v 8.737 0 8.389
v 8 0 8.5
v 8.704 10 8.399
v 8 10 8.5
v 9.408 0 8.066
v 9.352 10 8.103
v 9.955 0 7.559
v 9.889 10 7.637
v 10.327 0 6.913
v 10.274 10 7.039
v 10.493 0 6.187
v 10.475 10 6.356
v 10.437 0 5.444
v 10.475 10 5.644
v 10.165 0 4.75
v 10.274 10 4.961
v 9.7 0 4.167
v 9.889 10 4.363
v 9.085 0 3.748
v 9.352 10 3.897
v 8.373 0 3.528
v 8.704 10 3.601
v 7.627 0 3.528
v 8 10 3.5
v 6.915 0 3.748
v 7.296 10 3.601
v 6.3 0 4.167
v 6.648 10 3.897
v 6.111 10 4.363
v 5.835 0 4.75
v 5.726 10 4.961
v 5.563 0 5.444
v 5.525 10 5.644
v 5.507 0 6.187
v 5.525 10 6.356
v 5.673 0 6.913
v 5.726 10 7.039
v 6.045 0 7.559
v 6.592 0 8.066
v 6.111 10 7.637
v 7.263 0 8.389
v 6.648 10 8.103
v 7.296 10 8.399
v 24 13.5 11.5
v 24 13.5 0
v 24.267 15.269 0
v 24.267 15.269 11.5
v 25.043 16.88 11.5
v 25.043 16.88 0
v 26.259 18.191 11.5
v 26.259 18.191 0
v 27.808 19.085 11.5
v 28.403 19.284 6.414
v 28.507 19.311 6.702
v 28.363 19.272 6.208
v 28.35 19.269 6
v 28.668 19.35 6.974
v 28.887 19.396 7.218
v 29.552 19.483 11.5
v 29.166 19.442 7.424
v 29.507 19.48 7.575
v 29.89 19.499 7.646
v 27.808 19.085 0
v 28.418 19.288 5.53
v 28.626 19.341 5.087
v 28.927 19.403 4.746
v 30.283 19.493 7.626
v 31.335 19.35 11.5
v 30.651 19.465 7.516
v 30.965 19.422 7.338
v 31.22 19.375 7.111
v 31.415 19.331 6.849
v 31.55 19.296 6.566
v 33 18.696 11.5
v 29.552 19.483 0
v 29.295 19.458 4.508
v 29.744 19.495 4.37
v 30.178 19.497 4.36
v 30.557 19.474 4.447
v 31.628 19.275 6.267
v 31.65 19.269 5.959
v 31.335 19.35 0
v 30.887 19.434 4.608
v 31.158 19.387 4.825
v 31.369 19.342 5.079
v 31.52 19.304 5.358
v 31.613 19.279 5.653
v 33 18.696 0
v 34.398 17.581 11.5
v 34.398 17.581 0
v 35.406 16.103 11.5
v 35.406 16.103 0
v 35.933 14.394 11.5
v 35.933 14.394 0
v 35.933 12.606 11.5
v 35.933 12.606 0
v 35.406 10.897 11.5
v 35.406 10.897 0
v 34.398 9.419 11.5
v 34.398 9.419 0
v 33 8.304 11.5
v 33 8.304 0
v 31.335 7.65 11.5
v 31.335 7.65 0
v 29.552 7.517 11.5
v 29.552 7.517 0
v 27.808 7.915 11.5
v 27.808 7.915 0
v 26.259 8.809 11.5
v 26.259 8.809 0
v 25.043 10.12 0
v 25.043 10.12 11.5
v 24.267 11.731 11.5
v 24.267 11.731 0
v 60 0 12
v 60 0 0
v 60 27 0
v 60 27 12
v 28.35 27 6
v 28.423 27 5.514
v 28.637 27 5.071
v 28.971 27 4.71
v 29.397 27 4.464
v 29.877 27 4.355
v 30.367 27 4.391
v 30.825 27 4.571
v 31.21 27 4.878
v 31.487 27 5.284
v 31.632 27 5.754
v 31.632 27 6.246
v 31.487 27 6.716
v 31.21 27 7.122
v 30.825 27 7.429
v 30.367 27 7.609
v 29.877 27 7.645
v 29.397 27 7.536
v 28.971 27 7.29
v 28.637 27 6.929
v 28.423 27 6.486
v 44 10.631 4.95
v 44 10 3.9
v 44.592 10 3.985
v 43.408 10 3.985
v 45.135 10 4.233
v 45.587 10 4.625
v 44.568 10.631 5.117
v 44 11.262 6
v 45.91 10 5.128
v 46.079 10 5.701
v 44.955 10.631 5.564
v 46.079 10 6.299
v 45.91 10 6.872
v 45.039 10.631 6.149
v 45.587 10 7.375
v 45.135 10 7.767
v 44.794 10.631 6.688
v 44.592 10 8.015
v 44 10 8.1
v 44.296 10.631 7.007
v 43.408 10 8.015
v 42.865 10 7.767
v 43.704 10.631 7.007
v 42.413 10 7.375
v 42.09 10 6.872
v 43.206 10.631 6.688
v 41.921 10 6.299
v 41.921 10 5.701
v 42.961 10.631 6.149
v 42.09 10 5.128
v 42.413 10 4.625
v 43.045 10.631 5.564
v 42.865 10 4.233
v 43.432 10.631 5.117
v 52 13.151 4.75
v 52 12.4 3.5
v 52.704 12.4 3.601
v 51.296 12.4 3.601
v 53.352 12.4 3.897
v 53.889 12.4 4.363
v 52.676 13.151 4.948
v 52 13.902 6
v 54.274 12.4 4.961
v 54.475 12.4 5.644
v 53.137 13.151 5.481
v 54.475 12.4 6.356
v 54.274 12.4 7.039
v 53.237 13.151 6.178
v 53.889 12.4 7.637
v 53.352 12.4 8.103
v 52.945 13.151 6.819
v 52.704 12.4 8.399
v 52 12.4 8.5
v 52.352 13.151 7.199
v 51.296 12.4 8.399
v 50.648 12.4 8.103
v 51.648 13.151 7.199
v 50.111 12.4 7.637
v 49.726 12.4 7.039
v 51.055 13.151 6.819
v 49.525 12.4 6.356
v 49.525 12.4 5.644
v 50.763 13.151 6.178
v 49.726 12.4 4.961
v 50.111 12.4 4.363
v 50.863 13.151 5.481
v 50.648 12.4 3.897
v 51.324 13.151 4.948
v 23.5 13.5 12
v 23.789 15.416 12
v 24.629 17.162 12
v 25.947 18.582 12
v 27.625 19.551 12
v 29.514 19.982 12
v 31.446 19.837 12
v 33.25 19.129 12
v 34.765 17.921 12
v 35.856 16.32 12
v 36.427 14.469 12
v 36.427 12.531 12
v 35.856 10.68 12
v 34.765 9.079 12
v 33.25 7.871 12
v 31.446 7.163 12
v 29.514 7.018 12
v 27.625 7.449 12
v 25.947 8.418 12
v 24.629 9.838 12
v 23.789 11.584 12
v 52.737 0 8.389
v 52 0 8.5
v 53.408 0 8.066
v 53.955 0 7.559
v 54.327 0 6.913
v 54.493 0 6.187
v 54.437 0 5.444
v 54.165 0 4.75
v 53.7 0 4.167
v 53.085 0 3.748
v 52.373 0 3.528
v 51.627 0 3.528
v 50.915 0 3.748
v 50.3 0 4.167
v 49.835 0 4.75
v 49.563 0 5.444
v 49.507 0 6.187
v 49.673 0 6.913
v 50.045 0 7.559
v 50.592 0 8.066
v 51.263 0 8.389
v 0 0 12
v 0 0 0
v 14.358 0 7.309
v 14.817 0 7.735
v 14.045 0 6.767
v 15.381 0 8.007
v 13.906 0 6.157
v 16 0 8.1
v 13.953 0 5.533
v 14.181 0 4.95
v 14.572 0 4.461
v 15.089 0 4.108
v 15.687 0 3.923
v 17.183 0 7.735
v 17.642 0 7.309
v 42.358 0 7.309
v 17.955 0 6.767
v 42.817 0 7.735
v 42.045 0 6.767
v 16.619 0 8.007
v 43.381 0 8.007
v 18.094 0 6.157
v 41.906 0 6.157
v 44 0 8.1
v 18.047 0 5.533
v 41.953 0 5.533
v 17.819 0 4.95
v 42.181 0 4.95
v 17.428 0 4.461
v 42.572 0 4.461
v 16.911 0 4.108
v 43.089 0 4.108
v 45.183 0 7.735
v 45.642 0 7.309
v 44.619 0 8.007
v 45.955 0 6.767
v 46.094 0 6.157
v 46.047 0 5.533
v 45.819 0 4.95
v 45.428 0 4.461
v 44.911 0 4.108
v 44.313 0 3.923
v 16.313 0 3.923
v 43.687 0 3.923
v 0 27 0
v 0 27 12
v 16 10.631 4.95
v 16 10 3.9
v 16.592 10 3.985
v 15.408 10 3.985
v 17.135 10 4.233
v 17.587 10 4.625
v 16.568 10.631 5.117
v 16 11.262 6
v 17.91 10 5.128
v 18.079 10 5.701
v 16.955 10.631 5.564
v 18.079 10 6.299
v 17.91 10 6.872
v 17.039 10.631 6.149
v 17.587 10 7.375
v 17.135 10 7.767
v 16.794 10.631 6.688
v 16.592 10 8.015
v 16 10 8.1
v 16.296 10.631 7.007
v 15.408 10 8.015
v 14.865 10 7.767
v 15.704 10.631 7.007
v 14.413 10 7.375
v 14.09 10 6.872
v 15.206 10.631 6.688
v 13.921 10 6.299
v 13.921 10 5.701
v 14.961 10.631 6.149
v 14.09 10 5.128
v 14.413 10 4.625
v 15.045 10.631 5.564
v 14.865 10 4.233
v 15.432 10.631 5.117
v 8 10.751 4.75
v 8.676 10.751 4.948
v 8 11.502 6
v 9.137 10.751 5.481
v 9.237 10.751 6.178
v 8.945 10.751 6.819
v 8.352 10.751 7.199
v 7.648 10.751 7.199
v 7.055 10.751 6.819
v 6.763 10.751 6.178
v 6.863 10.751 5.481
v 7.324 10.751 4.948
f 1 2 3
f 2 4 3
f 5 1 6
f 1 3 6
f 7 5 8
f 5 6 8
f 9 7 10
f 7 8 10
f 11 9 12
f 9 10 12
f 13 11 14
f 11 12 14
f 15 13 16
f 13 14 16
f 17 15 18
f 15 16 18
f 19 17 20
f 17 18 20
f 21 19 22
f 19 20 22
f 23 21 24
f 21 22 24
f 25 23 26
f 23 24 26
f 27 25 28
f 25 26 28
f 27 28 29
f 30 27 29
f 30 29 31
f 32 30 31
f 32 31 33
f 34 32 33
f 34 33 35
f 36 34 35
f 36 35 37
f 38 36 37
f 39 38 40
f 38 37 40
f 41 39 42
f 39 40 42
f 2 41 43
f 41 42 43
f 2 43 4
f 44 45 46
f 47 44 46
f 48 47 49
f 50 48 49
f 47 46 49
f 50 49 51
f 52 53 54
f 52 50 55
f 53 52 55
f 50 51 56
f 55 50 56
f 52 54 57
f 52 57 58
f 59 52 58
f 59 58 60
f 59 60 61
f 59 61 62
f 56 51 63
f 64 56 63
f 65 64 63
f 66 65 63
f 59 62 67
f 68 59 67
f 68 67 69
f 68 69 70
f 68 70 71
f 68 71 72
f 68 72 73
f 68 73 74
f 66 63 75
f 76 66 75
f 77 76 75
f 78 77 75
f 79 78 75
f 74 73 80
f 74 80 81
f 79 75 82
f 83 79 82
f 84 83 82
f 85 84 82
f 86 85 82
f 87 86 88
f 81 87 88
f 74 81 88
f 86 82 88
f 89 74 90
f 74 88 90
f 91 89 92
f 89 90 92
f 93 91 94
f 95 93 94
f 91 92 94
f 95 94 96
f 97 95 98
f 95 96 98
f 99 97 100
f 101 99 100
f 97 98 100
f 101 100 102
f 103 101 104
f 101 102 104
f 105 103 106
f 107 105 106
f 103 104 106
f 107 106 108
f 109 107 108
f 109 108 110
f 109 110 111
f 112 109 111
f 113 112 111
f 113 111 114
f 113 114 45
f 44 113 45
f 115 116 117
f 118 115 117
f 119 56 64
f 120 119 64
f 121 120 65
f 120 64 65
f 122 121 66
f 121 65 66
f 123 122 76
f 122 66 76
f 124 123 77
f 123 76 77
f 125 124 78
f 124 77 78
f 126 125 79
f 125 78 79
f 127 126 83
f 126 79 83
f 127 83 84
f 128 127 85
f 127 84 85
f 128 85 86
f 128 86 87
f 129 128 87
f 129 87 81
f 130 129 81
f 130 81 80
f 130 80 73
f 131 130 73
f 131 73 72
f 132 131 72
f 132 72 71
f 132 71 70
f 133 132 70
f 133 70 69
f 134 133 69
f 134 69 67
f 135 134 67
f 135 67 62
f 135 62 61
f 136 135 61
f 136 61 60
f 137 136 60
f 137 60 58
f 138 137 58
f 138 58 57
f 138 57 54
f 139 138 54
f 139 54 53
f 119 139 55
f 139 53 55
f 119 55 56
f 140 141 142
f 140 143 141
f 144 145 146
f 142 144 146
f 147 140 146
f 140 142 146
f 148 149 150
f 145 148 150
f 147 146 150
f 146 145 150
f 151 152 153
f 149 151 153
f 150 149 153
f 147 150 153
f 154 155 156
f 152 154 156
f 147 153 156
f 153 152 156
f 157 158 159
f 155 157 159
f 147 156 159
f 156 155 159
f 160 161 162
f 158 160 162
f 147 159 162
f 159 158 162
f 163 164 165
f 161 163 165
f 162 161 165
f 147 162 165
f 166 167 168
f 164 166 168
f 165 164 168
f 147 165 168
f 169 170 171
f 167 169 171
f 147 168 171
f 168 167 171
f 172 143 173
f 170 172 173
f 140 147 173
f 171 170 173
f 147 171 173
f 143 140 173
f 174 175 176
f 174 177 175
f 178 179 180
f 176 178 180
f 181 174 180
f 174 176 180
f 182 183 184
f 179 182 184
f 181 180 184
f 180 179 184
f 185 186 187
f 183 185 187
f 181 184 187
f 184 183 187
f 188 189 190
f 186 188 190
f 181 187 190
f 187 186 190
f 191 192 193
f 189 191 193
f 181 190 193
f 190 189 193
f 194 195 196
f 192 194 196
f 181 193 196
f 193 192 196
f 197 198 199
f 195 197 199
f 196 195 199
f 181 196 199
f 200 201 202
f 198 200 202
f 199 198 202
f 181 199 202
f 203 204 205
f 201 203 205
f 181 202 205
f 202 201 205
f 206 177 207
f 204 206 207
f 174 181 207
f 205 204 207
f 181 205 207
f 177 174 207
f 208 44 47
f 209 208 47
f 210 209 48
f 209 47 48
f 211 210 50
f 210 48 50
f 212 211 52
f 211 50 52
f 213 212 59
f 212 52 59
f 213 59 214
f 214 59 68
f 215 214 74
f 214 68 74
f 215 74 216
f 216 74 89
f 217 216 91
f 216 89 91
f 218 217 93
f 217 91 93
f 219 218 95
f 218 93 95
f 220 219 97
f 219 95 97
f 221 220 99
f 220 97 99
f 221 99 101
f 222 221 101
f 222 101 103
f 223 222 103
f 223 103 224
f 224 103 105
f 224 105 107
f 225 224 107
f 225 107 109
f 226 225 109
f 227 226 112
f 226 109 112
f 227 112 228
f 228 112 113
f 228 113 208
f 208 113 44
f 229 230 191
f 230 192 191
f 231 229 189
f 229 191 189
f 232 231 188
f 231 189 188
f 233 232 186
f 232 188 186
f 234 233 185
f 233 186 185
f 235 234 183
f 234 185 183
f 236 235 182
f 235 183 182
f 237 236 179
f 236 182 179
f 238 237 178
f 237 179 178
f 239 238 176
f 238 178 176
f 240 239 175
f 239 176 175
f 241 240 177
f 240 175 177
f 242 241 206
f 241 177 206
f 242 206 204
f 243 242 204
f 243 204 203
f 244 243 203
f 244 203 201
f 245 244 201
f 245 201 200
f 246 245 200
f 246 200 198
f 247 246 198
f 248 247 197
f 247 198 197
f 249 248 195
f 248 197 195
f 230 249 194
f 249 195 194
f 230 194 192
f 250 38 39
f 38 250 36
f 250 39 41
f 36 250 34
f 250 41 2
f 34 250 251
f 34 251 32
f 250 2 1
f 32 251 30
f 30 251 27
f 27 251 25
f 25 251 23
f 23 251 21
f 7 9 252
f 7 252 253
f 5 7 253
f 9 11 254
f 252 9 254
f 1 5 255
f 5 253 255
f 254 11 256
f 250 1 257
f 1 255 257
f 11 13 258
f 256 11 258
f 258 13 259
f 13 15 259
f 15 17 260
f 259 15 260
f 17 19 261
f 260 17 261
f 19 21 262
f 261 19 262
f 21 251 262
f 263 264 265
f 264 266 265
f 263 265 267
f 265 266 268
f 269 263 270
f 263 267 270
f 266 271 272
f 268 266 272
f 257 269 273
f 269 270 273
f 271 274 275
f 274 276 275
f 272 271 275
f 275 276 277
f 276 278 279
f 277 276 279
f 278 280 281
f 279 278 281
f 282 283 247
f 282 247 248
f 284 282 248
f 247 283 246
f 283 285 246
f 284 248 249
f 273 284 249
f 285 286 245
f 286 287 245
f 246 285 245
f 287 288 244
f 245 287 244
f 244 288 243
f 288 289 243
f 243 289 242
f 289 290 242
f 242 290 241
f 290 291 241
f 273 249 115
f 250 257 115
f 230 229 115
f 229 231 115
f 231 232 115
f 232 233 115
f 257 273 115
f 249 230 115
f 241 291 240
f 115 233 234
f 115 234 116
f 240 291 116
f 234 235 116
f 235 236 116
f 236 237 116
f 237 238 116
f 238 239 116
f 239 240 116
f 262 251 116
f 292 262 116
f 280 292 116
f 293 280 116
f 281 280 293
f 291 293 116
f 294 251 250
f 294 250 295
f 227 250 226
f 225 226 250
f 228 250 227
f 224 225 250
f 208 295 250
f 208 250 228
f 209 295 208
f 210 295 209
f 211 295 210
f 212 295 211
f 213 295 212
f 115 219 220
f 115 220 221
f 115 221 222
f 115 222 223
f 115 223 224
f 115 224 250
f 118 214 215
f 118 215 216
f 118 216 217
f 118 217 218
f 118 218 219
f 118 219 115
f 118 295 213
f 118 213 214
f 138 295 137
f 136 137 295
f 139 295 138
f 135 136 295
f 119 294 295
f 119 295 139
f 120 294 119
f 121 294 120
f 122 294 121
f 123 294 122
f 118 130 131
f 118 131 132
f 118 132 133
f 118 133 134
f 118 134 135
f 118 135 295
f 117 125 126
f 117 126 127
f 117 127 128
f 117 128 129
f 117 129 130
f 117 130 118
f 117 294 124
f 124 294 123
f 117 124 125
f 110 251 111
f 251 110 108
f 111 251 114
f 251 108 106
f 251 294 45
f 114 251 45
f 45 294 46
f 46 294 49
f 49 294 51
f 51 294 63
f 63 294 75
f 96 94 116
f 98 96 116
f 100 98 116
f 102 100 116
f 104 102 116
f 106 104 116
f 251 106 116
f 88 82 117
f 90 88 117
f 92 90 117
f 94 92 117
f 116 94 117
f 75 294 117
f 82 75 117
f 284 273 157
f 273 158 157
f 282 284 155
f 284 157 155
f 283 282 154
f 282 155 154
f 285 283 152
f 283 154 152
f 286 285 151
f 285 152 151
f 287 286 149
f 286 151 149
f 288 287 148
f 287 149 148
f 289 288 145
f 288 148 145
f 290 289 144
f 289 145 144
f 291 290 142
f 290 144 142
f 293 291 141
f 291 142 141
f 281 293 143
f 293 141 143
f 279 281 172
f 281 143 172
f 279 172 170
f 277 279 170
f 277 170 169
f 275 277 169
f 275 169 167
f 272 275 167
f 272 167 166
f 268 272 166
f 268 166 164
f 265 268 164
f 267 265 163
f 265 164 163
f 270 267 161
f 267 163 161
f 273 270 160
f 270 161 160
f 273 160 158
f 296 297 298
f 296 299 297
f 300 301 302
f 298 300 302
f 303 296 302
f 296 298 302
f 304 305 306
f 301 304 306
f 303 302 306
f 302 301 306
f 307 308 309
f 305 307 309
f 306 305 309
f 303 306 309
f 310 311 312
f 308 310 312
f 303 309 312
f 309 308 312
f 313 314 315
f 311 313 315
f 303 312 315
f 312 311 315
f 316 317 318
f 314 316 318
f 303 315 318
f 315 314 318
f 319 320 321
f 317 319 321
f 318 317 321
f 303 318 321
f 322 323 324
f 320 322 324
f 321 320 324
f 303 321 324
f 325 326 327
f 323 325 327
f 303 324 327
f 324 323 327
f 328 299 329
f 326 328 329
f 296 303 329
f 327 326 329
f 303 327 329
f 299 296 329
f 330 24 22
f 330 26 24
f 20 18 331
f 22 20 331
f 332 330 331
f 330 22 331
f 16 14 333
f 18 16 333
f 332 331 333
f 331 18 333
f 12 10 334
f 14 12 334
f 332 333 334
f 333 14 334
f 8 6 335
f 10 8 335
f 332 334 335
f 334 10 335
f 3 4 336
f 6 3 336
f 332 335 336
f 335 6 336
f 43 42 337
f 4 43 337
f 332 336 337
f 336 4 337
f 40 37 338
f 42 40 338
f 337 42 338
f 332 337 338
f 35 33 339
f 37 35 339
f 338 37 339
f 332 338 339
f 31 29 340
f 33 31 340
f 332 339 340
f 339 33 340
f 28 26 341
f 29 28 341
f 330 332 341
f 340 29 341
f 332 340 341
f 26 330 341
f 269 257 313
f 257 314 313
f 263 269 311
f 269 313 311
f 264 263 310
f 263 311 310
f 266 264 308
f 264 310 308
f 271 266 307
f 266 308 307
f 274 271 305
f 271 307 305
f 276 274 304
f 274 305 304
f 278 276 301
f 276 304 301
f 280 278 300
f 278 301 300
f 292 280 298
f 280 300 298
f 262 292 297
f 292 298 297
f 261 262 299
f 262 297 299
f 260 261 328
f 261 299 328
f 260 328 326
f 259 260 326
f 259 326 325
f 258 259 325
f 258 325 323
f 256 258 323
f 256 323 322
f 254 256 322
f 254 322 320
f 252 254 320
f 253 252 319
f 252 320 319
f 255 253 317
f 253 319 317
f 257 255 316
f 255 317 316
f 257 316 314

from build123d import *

# Parameters (mm, degrees)
SKETCH2_W                            = 60
SKETCH2_H                            = 27
BOSS_EXTRUDE1_DEPTH                  = 12
F_12_0MM_CLEARANCE_DOWEL_HOLE1_D     = 12
F_12_0MM_CLEARANCE_DOWEL_HOLE1_DEPTH = 12.4
F_12_0MM_CLEARANCE_DOWEL_HOLE1_TIP   = 3.605163714
M4_TAPPED_HOLE1_D                    = 3.3
M4_TAPPED_HOLE1_DEPTH                = 10.1
M4_TAPPED_HOLE1_TIP                  = 0.991420021
CHAMFER1_SIZE                        = 0.5
F_5_0MM_CLEARANCE_DOWEL_HOLE3_D      = 5
F_5_0MM_CLEARANCE_DOWEL_HOLE3_DEPTH  = 10
F_5_0MM_CLEARANCE_DOWEL_HOLE3_TIP    = 1.502151548
M5_TAPPED_HOLE3_D                    = 4.2
M5_TAPPED_HOLE3_DEPTH                = 10
M5_TAPPED_HOLE3_TIP                  = 1.2618073
M5_TAPPED_HOLE4_D                    = 4.2
M5_TAPPED_HOLE4_DEPTH                = 10
M5_TAPPED_HOLE4_TIP                  = 1.2618073
F_5_0MM_CLEARANCE_DOWEL_HOLE4_D      = 5
F_5_0MM_CLEARANCE_DOWEL_HOLE4_DEPTH  = 12.4
F_5_0MM_CLEARANCE_DOWEL_HOLE4_TIP    = 1.502151548


with BuildPart() as part:
    # Sketch2 → Boss-Extrude1 (new body)
    with BuildSketch(Plane.XY):
        with Locations((30, 13.5)):
            Rectangle(SKETCH2_W, SKETCH2_H)
    extrude(amount=BOSS_EXTRUDE1_DEPTH)

    # Ø12.0mm Clearance Dowel Hole1
    with Locations(Plane.XY.offset(12)):
        with Locations((30, 13.5)):
            Hole(F_12_0MM_CLEARANCE_DOWEL_HOLE1_D / 2, depth=F_12_0MM_CLEARANCE_DOWEL_HOLE1_DEPTH)
            with Locations((0, 0, -(F_12_0MM_CLEARANCE_DOWEL_HOLE1_DEPTH + F_12_0MM_CLEARANCE_DOWEL_HOLE1_TIP / 2))):  # 118° drill point
                Cone(0, F_12_0MM_CLEARANCE_DOWEL_HOLE1_D / 2, F_12_0MM_CLEARANCE_DOWEL_HOLE1_TIP, mode=Mode.SUBTRACT)

    # M4 Tapped Hole1
    with Locations(Plane(origin=(0, 27, 0), x_dir=(1, 0, 0), z_dir=(0, 1, 0))):
        with Locations((30, -6)):
            Hole(M4_TAPPED_HOLE1_D / 2, depth=M4_TAPPED_HOLE1_DEPTH)
            with Locations((0, 0, -(M4_TAPPED_HOLE1_DEPTH + M4_TAPPED_HOLE1_TIP / 2))):  # 118° drill point
                Cone(0, M4_TAPPED_HOLE1_D / 2, M4_TAPPED_HOLE1_TIP, mode=Mode.SUBTRACT)

    # Chamfer1
    chamfer1_edges = [part.edges().sort_by_distance(p)[0] for p in [
        (36, 13.5, 12),
    ]]
    chamfer(chamfer1_edges, length=CHAMFER1_SIZE)

    # Ø5.0mm Clearance Dowel Hole3
    with Locations(Plane(origin=(8, 0, 6), x_dir=(0, 0, -1), z_dir=(0, -1, 0))):
        with Locations((0, 0)):
            Hole(F_5_0MM_CLEARANCE_DOWEL_HOLE3_D / 2, depth=F_5_0MM_CLEARANCE_DOWEL_HOLE3_DEPTH)
            with Locations((0, 0, -(F_5_0MM_CLEARANCE_DOWEL_HOLE3_DEPTH + F_5_0MM_CLEARANCE_DOWEL_HOLE3_TIP / 2))):  # 118° drill point
                Cone(0, F_5_0MM_CLEARANCE_DOWEL_HOLE3_D / 2, F_5_0MM_CLEARANCE_DOWEL_HOLE3_TIP, mode=Mode.SUBTRACT)

    # M5 Tapped Hole3
    with Locations(Plane(origin=(16, 0, 6), x_dir=(0, 0, -1), z_dir=(0, -1, 0))):
        with Locations((0, 0)):
            Hole(M5_TAPPED_HOLE3_D / 2, depth=M5_TAPPED_HOLE3_DEPTH)
            with Locations((0, 0, -(M5_TAPPED_HOLE3_DEPTH + M5_TAPPED_HOLE3_TIP / 2))):  # 118° drill point
                Cone(0, M5_TAPPED_HOLE3_D / 2, M5_TAPPED_HOLE3_TIP, mode=Mode.SUBTRACT)

    # M5 Tapped Hole4
    with Locations(Plane(origin=(44, 0, 6), x_dir=(0, 0, -1), z_dir=(0, -1, 0))):
        with Locations((0, 0)):
            Hole(M5_TAPPED_HOLE4_D / 2, depth=M5_TAPPED_HOLE4_DEPTH)
            with Locations((0, 0, -(M5_TAPPED_HOLE4_DEPTH + M5_TAPPED_HOLE4_TIP / 2))):  # 118° drill point
                Cone(0, M5_TAPPED_HOLE4_D / 2, M5_TAPPED_HOLE4_TIP, mode=Mode.SUBTRACT)

    # Ø5.0mm Clearance Dowel Hole4
    with Locations(Plane(origin=(52, 0, 6), x_dir=(0, 0, -1), z_dir=(0, -1, 0))):
        with Locations((0, 0)):
            Hole(F_5_0MM_CLEARANCE_DOWEL_HOLE4_D / 2, depth=F_5_0MM_CLEARANCE_DOWEL_HOLE4_DEPTH)
            with Locations((0, 0, -(F_5_0MM_CLEARANCE_DOWEL_HOLE4_DEPTH + F_5_0MM_CLEARANCE_DOWEL_HOLE4_TIP / 2))):  # 118° drill point
                Cone(0, F_5_0MM_CLEARANCE_DOWEL_HOLE4_D / 2, F_5_0MM_CLEARANCE_DOWEL_HOLE4_TIP, mode=Mode.SUBTRACT)


solid = part.part
